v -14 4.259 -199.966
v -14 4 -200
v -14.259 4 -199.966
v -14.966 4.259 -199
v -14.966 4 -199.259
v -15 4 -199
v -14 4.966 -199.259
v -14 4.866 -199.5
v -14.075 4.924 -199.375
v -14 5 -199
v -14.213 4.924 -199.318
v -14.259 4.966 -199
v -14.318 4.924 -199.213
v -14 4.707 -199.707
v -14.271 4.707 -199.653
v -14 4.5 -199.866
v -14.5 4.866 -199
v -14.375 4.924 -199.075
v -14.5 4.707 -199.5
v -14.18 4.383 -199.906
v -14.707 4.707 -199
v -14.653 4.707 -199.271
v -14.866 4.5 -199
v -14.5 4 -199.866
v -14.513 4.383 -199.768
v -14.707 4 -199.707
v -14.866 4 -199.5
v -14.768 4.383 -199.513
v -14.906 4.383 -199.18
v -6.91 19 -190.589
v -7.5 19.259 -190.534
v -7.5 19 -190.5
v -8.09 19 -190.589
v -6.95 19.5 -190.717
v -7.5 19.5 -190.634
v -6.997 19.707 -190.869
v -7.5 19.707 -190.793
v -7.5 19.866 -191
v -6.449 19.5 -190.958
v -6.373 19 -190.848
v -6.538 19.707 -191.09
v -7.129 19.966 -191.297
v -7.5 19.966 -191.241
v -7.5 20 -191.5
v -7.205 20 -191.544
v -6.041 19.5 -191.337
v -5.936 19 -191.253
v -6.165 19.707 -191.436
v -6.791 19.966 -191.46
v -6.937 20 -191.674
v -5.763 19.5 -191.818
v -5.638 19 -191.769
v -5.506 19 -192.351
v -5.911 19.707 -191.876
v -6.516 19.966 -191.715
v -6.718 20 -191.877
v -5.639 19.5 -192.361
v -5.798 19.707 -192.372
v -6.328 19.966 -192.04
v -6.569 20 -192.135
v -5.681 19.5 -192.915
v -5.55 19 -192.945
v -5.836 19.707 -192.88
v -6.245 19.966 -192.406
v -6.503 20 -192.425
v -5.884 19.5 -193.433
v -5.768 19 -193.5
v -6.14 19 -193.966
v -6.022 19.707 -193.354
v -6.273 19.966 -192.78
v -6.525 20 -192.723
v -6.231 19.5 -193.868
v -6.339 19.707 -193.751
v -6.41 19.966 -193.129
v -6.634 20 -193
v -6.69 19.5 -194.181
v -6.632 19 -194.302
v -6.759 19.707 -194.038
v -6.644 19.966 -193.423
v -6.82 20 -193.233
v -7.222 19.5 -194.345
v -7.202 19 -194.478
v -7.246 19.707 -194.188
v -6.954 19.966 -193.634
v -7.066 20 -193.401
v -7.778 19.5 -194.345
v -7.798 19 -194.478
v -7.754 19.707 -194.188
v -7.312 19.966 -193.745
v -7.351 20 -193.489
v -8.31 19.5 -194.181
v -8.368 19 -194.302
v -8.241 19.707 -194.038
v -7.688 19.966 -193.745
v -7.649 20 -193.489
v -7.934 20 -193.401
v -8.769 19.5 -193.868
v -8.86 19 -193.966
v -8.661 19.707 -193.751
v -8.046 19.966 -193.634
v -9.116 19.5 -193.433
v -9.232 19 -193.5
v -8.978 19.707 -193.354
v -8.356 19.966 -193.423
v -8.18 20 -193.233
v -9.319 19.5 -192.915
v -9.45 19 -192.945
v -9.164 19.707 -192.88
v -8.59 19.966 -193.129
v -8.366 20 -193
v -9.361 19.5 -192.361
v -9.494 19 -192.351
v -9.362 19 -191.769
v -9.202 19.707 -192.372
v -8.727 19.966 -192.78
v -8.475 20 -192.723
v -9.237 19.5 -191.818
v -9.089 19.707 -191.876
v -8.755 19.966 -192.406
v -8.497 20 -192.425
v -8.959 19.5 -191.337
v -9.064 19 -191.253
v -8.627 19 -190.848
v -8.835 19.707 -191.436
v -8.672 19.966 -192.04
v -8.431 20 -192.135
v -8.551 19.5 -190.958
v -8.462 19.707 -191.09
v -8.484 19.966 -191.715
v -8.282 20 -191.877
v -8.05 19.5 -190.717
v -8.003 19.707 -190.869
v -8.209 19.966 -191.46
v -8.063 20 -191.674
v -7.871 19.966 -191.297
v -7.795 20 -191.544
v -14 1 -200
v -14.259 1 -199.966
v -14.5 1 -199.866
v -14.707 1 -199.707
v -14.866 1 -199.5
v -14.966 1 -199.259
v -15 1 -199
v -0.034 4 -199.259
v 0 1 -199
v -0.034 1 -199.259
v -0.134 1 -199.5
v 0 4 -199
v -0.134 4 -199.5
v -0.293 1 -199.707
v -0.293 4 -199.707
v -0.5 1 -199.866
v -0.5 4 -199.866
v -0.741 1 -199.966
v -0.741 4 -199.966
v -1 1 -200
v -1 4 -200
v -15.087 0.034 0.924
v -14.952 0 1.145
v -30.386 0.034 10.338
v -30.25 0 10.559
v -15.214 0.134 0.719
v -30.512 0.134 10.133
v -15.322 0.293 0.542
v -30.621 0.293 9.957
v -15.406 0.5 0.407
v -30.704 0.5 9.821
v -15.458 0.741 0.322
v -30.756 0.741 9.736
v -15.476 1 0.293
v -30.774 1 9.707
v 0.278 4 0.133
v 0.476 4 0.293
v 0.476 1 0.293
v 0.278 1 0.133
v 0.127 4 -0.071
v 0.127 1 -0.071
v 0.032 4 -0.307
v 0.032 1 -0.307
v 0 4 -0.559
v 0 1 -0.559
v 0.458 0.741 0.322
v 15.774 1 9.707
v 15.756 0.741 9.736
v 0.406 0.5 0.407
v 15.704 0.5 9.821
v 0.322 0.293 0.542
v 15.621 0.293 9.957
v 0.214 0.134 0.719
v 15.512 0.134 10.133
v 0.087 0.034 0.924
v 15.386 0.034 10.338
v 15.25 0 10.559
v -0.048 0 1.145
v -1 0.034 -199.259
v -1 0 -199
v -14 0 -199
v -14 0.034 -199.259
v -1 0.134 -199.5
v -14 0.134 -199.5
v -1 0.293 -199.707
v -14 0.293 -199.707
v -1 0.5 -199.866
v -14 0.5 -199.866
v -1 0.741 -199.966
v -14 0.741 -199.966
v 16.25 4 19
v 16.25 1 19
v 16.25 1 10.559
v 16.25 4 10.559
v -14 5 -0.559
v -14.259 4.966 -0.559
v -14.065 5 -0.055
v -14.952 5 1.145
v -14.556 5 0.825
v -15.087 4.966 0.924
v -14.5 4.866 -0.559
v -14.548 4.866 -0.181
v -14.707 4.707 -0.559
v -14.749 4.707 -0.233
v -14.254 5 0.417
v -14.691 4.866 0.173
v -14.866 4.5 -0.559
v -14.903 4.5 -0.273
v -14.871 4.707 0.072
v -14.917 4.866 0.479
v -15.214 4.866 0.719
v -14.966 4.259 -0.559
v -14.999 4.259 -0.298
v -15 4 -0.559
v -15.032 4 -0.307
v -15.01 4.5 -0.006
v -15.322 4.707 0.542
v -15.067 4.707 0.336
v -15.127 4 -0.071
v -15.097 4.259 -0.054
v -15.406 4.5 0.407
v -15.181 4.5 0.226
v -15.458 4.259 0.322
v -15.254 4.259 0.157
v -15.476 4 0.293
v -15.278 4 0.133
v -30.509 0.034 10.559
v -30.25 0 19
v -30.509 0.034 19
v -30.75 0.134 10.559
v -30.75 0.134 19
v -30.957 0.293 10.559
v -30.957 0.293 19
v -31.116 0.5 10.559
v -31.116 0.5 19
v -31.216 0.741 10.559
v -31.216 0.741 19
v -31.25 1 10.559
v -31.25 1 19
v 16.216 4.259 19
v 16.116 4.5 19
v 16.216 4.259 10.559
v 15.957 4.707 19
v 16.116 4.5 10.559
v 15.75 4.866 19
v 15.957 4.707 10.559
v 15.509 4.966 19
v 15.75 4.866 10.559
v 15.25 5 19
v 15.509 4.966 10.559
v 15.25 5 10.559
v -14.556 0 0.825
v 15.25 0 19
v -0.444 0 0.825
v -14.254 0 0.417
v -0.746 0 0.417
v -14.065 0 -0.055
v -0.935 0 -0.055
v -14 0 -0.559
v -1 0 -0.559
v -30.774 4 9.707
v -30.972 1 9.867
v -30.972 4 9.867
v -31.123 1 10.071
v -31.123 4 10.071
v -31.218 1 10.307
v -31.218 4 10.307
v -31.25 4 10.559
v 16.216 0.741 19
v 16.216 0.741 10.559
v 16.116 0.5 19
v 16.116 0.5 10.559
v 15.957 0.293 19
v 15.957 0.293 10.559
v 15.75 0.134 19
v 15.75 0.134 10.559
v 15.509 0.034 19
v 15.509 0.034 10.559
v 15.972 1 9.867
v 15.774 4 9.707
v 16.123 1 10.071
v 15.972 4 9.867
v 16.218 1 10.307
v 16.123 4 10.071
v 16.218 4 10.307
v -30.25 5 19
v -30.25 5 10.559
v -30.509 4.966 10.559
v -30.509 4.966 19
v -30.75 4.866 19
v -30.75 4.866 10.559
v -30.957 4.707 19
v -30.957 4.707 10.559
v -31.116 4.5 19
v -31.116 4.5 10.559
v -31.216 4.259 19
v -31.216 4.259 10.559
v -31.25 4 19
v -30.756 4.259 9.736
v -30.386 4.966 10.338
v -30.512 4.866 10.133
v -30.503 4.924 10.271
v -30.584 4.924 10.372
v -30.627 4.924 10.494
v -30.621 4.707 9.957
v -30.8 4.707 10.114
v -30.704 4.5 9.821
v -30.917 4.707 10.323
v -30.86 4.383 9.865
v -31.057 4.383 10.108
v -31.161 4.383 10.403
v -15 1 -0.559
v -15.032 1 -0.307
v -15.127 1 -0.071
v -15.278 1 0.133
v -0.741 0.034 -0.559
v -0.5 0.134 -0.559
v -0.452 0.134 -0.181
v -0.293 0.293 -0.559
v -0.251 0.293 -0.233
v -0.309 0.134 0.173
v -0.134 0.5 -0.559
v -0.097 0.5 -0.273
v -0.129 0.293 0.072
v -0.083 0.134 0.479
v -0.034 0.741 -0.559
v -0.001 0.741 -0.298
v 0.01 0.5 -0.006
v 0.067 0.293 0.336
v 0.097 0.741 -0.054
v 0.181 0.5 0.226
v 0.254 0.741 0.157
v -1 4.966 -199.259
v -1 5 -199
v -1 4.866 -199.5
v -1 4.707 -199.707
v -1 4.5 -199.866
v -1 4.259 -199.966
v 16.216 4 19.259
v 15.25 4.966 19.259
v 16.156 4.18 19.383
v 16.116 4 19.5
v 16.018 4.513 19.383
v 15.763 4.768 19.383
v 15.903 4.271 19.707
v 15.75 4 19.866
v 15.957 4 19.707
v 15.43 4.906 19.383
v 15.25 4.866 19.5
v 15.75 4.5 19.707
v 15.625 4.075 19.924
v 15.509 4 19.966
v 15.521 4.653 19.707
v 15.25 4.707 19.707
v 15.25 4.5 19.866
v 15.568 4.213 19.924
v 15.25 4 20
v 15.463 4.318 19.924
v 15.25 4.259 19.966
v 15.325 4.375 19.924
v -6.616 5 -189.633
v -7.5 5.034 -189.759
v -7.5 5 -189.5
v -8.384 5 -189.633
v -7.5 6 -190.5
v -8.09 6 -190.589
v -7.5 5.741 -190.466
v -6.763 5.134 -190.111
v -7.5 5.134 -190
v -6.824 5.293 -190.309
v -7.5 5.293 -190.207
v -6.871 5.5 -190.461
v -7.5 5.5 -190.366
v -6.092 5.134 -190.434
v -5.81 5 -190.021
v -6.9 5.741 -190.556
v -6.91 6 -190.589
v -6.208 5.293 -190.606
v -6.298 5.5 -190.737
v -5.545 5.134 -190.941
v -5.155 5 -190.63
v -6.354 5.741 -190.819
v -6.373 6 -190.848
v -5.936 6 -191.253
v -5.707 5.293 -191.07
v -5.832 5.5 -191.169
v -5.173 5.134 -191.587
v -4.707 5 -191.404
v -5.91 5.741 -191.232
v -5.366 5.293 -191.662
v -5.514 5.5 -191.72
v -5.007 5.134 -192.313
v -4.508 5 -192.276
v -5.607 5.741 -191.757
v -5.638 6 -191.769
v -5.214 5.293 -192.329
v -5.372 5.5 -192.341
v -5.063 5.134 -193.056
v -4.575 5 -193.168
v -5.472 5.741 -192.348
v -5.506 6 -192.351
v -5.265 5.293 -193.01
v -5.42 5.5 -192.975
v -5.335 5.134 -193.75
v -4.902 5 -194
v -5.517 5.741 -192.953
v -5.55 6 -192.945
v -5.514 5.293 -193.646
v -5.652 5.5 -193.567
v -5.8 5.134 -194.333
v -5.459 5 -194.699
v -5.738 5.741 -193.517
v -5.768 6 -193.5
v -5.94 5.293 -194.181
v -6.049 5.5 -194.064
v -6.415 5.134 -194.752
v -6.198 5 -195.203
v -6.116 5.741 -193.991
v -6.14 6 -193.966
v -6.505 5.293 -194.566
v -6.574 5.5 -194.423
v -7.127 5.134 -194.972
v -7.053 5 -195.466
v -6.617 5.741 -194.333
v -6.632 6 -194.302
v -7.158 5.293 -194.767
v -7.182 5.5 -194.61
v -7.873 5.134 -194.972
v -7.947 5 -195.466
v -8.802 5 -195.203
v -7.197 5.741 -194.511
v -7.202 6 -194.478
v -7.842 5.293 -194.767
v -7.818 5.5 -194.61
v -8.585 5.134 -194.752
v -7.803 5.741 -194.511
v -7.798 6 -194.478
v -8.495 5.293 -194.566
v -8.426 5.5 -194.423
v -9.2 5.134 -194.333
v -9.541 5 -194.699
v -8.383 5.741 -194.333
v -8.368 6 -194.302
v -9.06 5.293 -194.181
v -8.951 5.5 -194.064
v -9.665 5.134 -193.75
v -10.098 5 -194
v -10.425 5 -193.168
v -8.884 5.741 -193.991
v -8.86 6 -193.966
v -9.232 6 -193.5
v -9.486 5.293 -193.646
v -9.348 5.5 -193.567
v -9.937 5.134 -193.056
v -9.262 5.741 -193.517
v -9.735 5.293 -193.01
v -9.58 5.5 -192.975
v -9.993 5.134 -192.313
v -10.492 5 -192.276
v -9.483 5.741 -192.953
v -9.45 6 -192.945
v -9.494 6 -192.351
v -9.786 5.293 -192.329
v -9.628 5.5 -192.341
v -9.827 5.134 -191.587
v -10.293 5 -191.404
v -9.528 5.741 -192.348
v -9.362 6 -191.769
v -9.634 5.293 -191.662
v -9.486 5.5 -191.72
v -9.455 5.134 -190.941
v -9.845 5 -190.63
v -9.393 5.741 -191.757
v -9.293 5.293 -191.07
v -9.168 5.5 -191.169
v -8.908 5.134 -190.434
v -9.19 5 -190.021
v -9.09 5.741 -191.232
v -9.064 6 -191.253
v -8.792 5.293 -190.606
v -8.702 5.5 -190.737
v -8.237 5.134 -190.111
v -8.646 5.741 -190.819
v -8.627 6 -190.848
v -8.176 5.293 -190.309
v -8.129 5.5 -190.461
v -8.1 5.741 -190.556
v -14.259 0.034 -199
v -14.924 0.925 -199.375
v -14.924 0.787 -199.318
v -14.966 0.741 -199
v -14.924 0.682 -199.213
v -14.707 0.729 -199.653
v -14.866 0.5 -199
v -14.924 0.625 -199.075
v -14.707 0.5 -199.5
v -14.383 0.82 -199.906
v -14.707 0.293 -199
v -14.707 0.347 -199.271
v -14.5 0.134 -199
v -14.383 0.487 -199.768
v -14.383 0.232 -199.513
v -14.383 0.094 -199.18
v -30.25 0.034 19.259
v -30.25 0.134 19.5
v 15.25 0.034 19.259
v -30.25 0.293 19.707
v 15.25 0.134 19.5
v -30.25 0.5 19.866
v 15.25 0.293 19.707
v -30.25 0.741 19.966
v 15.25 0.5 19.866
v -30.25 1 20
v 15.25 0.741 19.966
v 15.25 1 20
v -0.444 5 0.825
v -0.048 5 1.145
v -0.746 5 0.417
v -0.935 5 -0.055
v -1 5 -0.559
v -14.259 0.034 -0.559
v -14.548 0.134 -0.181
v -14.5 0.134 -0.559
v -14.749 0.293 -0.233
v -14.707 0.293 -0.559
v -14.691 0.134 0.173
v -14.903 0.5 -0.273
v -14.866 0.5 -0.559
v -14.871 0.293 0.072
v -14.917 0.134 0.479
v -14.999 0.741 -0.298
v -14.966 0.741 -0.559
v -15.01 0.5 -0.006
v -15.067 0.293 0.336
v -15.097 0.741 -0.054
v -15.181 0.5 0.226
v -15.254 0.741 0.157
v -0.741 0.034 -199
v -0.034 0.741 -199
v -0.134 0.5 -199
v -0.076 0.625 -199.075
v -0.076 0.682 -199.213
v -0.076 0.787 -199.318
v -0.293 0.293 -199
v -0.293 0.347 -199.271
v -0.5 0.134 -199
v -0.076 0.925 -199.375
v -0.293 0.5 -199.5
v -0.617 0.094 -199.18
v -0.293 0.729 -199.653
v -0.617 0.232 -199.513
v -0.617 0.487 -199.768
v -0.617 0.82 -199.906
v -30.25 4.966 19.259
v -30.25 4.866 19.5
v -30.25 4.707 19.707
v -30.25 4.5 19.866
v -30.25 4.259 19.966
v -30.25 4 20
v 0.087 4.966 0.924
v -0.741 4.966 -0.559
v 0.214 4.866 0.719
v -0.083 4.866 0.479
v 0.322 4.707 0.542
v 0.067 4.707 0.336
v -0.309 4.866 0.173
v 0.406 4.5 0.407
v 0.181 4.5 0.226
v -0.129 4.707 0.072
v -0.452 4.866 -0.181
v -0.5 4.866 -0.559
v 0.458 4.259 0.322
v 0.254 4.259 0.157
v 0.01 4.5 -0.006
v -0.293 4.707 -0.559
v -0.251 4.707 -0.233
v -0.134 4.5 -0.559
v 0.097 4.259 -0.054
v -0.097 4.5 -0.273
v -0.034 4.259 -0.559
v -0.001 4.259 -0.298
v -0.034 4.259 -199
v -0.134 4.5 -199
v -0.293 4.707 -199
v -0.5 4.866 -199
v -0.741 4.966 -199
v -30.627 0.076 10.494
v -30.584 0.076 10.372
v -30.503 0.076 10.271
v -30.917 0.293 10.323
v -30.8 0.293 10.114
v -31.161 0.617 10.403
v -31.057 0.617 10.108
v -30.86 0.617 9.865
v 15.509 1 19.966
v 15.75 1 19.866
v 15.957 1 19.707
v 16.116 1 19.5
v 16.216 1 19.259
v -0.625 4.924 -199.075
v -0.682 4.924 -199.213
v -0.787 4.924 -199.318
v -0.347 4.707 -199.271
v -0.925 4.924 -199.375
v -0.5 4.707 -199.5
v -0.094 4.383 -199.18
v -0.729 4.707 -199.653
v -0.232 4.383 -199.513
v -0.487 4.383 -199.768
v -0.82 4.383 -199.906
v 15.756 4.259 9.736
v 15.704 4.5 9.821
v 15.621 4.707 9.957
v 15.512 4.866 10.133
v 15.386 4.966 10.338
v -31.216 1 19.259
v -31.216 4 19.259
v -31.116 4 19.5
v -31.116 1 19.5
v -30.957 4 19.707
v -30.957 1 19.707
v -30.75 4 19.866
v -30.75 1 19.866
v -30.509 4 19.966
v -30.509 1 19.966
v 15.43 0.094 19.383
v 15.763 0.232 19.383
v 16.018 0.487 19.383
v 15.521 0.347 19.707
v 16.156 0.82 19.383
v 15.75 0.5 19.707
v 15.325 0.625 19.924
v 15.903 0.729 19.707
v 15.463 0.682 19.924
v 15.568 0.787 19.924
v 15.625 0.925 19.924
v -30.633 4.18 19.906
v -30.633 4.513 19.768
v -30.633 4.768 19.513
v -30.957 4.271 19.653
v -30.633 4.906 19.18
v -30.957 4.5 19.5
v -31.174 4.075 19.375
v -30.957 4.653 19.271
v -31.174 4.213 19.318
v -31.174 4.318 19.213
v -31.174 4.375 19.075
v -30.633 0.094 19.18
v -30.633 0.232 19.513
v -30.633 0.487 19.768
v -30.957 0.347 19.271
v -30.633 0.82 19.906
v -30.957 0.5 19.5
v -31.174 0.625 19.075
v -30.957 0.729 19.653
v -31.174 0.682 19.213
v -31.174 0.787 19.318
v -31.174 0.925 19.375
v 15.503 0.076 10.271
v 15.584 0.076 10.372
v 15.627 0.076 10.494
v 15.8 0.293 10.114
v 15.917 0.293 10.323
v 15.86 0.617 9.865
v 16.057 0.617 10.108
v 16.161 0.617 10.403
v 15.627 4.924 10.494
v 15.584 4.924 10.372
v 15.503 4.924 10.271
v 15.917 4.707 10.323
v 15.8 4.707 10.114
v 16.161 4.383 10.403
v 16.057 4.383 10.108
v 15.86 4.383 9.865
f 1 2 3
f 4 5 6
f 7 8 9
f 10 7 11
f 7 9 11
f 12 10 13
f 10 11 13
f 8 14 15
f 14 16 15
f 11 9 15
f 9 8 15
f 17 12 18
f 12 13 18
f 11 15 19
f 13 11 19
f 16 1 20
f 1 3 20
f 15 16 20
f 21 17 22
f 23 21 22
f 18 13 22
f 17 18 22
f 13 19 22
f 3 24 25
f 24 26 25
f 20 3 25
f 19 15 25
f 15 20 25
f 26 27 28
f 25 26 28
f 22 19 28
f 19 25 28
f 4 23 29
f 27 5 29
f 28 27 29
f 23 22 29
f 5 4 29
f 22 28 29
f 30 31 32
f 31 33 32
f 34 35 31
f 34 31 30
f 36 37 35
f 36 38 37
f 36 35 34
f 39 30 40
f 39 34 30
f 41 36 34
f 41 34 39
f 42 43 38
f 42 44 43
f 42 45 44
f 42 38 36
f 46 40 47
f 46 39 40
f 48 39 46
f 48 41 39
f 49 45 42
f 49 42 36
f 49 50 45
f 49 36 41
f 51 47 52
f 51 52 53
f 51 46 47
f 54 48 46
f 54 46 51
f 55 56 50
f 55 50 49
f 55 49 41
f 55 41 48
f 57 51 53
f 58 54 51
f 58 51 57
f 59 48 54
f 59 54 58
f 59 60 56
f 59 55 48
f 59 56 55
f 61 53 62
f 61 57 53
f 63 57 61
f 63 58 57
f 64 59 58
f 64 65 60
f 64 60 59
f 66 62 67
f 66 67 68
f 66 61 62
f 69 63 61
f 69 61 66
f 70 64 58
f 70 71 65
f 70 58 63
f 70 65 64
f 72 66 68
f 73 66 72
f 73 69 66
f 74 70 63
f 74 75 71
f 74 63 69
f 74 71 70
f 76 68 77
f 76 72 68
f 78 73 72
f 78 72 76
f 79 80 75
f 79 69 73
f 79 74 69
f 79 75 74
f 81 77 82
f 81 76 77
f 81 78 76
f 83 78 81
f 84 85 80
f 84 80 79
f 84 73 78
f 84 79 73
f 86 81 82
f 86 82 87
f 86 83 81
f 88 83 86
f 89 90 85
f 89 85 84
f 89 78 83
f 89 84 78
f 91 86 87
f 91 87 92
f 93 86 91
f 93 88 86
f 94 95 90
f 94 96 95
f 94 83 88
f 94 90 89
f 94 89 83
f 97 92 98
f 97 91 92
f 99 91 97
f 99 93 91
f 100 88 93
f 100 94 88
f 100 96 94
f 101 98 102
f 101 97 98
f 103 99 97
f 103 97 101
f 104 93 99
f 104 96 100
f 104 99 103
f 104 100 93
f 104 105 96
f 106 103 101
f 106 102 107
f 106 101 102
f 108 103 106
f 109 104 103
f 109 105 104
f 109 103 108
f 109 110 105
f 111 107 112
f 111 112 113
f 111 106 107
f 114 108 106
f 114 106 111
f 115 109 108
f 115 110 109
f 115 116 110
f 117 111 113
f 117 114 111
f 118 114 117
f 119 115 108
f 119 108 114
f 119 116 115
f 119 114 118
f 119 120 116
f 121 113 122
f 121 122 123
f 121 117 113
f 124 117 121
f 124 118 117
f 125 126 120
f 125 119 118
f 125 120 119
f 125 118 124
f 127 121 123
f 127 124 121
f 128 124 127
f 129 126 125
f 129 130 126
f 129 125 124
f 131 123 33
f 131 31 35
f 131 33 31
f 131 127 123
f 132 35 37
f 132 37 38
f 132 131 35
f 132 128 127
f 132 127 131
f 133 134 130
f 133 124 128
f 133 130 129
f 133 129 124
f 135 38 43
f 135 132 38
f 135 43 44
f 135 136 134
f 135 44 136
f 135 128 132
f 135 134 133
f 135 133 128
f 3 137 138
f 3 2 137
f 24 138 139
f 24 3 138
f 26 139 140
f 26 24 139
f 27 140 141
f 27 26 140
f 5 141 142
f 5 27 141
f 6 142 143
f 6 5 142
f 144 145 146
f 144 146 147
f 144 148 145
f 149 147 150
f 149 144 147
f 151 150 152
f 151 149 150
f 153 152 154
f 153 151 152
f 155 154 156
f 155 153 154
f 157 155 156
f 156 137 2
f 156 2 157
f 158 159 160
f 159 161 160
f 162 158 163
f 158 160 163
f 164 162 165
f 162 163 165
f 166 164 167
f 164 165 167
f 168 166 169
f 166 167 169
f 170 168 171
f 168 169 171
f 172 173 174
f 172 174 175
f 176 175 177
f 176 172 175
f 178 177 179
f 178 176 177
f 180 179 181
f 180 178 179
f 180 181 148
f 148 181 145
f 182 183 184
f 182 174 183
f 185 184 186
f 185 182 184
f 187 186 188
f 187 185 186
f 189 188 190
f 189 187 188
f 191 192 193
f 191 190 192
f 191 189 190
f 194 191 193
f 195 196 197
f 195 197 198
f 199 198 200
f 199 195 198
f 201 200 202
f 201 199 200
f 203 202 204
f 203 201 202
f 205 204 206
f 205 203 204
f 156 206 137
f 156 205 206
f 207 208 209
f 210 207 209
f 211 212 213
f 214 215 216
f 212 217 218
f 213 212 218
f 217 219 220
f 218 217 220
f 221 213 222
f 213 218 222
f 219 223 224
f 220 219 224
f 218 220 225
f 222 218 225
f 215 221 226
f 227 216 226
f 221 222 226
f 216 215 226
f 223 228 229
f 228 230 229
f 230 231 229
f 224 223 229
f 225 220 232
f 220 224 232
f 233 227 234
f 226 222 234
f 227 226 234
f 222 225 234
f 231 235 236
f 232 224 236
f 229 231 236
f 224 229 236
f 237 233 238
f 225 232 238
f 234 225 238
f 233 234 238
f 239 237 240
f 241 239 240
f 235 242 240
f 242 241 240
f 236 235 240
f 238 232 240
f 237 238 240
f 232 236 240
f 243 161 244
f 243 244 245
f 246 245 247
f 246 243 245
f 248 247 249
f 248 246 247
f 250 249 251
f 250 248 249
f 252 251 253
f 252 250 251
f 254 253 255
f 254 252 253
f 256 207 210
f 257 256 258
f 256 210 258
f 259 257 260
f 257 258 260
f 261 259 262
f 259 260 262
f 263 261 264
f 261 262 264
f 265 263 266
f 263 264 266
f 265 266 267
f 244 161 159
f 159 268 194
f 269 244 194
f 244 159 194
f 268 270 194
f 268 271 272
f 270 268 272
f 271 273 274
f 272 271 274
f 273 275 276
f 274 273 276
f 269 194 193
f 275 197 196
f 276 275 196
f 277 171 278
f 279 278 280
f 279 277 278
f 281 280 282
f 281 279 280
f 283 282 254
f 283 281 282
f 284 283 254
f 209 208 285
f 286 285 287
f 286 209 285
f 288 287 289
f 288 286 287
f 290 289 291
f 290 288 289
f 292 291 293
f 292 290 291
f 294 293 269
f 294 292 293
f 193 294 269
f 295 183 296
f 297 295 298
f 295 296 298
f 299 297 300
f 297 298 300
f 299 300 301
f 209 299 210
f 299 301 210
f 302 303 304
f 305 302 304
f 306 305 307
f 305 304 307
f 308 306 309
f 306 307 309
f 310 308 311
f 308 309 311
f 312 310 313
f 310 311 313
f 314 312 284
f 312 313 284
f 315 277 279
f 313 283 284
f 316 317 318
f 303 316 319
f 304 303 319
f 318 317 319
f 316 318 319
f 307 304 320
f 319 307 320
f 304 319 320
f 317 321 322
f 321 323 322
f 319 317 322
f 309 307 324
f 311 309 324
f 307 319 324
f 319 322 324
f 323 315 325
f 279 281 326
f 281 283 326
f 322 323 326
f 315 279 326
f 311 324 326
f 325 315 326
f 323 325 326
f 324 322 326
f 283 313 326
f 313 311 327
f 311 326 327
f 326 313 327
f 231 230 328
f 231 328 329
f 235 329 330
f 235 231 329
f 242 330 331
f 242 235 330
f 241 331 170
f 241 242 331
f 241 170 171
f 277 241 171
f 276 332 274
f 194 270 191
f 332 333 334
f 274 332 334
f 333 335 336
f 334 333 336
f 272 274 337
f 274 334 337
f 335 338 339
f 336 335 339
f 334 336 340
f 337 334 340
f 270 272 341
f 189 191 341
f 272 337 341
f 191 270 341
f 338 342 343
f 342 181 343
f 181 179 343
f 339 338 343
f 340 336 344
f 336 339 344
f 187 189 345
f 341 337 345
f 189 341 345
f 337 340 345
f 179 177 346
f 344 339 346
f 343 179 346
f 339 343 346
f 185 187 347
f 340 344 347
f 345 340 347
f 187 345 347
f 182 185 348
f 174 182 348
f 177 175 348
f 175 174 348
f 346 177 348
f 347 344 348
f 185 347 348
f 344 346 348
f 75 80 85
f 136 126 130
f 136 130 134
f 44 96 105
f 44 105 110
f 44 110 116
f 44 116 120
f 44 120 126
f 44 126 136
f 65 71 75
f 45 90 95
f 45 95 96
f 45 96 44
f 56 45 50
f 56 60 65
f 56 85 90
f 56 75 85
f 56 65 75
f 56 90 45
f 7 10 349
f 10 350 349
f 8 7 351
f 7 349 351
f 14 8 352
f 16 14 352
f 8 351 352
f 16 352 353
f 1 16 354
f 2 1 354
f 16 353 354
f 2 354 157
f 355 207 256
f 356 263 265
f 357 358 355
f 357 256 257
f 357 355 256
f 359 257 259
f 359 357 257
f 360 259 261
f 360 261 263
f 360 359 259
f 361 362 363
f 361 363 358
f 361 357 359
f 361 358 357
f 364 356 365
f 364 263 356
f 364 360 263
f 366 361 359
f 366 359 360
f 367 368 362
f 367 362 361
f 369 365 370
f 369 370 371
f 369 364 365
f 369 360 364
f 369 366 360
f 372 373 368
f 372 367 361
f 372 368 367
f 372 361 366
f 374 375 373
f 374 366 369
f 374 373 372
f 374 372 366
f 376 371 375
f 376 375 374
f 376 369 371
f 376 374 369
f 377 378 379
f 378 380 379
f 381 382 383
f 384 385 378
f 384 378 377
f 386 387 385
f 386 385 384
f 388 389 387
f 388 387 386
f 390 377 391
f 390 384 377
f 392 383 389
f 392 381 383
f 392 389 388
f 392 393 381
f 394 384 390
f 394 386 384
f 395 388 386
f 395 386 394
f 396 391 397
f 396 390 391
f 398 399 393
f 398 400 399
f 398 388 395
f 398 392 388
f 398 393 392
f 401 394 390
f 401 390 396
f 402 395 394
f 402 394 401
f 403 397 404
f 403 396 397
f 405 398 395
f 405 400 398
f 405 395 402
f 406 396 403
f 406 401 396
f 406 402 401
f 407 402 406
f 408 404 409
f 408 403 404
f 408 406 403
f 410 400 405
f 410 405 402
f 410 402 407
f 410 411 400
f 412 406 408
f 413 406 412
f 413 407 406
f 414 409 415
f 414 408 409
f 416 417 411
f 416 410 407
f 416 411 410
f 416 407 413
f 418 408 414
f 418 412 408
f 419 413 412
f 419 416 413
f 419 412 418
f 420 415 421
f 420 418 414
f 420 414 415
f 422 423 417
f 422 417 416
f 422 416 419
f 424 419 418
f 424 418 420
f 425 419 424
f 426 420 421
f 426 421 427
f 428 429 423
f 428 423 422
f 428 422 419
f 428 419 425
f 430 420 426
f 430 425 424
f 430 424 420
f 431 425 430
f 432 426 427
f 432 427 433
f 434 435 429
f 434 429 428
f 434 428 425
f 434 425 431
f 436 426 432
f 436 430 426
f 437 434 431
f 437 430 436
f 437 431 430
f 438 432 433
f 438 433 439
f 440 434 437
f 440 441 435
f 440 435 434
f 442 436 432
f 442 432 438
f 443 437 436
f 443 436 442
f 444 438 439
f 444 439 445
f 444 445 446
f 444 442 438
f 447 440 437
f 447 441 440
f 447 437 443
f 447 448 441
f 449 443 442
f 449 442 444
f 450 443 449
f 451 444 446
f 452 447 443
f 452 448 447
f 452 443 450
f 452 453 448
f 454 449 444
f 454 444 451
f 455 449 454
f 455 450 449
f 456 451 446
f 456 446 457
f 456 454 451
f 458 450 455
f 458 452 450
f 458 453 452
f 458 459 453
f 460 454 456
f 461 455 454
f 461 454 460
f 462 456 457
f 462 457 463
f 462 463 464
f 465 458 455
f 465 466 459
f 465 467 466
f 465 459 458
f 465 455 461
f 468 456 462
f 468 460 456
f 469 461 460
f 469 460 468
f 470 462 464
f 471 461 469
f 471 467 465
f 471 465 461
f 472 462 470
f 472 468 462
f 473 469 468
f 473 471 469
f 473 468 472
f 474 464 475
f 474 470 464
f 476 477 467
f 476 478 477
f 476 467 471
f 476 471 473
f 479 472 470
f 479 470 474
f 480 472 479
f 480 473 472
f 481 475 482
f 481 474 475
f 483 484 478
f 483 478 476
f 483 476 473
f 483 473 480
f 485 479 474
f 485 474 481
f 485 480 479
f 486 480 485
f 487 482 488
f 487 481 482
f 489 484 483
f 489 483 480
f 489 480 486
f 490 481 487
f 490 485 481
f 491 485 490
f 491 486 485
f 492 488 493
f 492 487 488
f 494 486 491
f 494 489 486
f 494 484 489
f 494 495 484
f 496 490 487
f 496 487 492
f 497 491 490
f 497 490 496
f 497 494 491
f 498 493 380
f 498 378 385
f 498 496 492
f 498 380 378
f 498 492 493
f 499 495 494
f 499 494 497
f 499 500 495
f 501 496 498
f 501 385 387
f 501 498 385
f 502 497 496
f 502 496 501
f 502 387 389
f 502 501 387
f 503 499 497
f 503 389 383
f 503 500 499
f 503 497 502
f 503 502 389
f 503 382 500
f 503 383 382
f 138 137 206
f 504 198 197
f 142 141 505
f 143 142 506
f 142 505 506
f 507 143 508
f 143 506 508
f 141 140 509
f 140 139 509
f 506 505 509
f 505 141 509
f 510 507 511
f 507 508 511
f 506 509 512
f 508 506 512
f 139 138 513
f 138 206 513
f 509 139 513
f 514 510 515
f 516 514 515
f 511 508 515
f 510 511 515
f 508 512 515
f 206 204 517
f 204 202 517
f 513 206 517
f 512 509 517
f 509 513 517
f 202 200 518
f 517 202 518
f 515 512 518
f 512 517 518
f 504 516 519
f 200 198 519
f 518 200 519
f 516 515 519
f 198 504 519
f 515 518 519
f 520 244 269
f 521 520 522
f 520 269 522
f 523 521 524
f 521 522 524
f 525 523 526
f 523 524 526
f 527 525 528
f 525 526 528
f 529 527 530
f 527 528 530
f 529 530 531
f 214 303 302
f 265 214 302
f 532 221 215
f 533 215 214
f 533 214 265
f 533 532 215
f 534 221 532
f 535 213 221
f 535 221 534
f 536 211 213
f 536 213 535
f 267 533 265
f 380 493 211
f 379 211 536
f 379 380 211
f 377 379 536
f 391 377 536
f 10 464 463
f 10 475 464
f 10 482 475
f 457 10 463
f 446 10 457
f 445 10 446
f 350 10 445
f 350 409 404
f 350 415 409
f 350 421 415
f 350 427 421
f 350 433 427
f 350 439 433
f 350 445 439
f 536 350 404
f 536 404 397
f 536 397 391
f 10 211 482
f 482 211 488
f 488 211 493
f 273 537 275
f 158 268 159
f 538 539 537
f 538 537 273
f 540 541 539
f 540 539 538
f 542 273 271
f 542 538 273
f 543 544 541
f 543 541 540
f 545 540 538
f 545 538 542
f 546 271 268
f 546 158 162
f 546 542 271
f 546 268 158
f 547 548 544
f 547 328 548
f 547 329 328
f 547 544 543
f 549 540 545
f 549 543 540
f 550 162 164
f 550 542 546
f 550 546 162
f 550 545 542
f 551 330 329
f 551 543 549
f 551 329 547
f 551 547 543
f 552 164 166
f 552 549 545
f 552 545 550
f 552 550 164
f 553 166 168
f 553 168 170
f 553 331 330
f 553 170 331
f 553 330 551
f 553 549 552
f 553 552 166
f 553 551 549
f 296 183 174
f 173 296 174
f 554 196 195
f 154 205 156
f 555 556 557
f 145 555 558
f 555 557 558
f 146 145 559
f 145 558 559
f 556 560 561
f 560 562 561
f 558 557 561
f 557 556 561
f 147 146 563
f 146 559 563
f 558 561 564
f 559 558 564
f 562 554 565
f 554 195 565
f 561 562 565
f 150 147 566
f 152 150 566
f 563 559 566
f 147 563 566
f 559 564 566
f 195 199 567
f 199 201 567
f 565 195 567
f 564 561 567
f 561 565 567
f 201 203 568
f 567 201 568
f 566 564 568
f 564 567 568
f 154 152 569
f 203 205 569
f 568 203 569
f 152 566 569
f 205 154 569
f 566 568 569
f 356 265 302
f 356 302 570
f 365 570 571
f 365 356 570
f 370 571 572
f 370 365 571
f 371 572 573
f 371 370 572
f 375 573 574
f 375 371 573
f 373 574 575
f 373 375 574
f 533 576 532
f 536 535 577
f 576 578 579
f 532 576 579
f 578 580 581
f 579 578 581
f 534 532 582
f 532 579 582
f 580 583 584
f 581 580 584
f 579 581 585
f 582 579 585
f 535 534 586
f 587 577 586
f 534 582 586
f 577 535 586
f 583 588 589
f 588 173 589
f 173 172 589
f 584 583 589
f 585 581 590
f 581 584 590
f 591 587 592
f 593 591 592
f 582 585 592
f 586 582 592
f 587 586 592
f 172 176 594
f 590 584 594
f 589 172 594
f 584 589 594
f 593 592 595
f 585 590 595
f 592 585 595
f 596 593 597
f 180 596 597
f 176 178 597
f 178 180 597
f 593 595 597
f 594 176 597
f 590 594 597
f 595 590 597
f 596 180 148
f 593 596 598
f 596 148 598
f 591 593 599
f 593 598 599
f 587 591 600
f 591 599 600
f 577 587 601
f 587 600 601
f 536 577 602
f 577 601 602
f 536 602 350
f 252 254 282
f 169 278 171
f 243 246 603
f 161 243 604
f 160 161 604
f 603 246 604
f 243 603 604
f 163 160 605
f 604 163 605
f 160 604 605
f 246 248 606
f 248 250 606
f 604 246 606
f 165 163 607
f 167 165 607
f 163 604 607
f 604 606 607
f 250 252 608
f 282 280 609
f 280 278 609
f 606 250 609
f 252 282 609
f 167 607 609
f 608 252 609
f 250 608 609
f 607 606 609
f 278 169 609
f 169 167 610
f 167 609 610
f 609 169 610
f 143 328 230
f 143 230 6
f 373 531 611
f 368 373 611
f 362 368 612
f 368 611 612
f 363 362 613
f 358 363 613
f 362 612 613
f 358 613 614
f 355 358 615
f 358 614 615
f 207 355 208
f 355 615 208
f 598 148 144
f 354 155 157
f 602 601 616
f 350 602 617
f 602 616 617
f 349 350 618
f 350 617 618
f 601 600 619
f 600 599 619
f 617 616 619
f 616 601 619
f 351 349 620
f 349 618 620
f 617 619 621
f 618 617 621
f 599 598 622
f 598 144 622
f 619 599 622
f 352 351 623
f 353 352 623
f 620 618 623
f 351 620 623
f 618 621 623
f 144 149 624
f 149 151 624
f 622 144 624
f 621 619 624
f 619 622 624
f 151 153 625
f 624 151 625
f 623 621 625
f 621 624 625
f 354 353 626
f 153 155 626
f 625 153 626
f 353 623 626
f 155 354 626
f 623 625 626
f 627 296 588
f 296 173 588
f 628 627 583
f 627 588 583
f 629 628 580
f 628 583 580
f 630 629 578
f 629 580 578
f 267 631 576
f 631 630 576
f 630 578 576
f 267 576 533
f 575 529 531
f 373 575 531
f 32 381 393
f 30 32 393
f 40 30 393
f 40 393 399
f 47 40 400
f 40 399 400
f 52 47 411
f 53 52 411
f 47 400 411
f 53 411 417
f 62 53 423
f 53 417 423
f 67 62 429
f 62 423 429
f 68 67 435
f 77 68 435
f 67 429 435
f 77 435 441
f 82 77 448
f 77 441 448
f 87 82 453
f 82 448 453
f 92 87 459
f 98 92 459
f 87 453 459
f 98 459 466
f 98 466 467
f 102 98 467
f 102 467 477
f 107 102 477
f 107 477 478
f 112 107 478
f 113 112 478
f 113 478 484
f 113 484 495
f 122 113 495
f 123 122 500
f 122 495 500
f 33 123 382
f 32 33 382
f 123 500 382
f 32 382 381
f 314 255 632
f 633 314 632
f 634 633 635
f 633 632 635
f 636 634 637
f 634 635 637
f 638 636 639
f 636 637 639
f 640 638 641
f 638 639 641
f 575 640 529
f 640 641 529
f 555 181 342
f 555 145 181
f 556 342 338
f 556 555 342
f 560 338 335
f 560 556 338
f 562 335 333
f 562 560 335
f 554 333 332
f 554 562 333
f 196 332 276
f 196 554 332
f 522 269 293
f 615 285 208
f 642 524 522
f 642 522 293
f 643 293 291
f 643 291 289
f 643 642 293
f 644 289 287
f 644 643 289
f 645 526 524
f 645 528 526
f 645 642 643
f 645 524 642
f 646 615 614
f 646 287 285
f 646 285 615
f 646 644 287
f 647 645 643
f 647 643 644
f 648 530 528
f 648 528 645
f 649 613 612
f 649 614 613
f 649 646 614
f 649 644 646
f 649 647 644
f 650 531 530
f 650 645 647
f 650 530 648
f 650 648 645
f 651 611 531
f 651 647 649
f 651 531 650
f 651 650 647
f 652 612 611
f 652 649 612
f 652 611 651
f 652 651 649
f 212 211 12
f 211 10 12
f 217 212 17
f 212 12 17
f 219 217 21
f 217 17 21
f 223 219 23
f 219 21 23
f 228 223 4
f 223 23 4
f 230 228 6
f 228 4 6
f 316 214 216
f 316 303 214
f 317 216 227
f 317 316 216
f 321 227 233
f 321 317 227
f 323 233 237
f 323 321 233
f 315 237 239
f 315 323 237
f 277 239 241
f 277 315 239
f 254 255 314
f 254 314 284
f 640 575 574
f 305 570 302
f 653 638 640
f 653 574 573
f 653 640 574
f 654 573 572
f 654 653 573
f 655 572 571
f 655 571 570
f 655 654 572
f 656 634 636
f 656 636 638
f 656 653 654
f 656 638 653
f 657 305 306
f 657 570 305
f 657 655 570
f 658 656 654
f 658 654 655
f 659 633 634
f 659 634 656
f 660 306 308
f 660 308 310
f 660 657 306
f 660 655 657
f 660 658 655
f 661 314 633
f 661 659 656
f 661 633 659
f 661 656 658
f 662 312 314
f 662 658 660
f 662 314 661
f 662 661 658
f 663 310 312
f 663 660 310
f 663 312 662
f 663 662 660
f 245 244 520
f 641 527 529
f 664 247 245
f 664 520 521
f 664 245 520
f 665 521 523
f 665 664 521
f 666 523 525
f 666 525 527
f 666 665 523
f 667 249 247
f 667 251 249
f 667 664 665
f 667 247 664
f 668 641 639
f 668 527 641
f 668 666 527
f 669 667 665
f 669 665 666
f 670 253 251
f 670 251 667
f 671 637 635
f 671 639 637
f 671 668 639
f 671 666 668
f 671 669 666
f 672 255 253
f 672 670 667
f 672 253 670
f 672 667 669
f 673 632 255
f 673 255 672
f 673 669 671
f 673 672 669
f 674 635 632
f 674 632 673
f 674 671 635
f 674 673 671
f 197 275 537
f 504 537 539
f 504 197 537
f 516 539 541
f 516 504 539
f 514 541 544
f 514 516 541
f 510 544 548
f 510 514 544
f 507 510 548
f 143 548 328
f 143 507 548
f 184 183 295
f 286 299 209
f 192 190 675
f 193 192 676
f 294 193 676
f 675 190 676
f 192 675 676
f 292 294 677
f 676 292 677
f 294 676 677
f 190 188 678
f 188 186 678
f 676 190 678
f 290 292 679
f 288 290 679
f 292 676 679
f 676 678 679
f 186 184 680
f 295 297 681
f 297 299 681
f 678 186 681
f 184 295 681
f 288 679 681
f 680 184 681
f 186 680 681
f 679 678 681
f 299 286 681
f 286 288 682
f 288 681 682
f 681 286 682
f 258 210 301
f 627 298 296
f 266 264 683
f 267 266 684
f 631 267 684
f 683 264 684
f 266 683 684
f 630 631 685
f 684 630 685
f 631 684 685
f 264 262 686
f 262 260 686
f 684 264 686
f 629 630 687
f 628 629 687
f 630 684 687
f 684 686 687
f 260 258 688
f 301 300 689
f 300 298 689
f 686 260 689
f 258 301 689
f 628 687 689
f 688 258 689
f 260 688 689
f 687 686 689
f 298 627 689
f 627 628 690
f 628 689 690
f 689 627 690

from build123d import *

# Parameters (mm, degrees)
SKETCH1_W           = 15
SKETCH1_H           = 200
SKETCH1_W_2         = 47.5
SKETCH1_H_2         = 10
BOSS_EXTRUDE1_DEPTH = 5
SKETCH4_R           = 2
BOSS_EXTRUDE3_DEPTH = 15
FILLET5_R           = 1
FILLET6_R           = 1


with BuildPart() as part:
    # Sketch1 → Boss-Extrude1 (new body)
    with BuildSketch(Plane(origin=(0, 0, 0), x_dir=(1, 0, 0), z_dir=(0, 1, 0))):
        Polygon((-31.25, -10), (16.25, -10), (0, 0), (-15, 0), align=None)
        with Locations((-7.5, 100)):
            Rectangle(SKETCH1_W, SKETCH1_H)
        with Locations((-7.5, -15)):
            Rectangle(SKETCH1_W_2, SKETCH1_H_2)
    extrude(amount=BOSS_EXTRUDE1_DEPTH)

    # Sketch4 → Boss-Extrude3 (add)
    with BuildSketch(Plane(origin=(0, 5, 0), x_dir=(1, 0, 0), z_dir=(0, 1, 0))):
        with Locations(Location((-7.5, 192.5, 0), (0, 0, 270))):
            Circle(SKETCH4_R)
    extrude(amount=BOSS_EXTRUDE3_DEPTH)

    # Fillet5
    fillet5_edges = [part.edges().sort_by_distance(p)[0] for p in [
        (-31.25, 5, 15),
        (-7.5, 0, -200),
        (0, 0, -100),
        (8.125, 0, 5),
        (16.25, 0, 15),
        (-7.5, 0, 20),
        (-31.25, 0, 15),
        (-23.125, 0, 5),
        (-7.5, 5, 20),
        (-15, 2.5, 0),
        (-15, 2.5, -200),
        (0, 2.5, -200),
        (0, 2.5, 0),
        (16.25, 2.5, 10),
        (-31.25, 2.5, 10),
        (16.25, 5, 15),
        (8.125, 5, 5),
        (-7.5, 5, -194.5),
        (-7.5, 20, -194.5),
        (0, 5, -100),
        (-7.5, 5, -200),
        (-15, 5, -100),
        (-23.125, 5, 5),
        (-15, 0, -100),
    ]]
    fillet(fillet5_edges, radius=FILLET5_R)

    # Fillet6
    # the kernel refuses this fillet: 1 mm, written as the material it takes off along each edge
    with BuildSketch(Plane(origin=(15.25, 4, 19), x_dir=(1, 0, 0), z_dir=(0, 0, 1))) as fillet6_piece_1_section:
        Polygon((0, 0), (FILLET6_R, 0), (FILLET6_R, FILLET6_R), (0, FILLET6_R), align=None)
    fillet6_piece_1 = extrude(amount=FILLET6_R, mode=Mode.PRIVATE)
    fillet6_piece_1 = fillet6_piece_1 - Plane(origin=(15.25, 4, 19), x_dir=(-0.7071067811865475, -0.7071067811865475, 0), z_dir=(0, 0, 1)) * Sphere(FILLET6_R, mode=Mode.PRIVATE)
    add(fillet6_piece_1, mode=Mode.SUBTRACT)
    with BuildSketch(Plane(origin=(15.25, 1, 19), x_dir=(1, 0, 0), z_dir=(0, 0, 1))) as fillet6_piece_2_section:
        Polygon((0, 0), (FILLET6_R, 0), (FILLET6_R, -FILLET6_R), (0, -FILLET6_R), align=None)
    fillet6_piece_2 = extrude(amount=FILLET6_R, mode=Mode.PRIVATE)
    fillet6_piece_2 = fillet6_piece_2 - Plane(origin=(15.25, 1, 19), x_dir=(-0.7071067811865475, 0.7071067811865475, 0), z_dir=(0, 0, 1)) * Sphere(FILLET6_R, mode=Mode.PRIVATE)
    add(fillet6_piece_2, mode=Mode.SUBTRACT)
    with BuildSketch(Plane(origin=(-30.25, 4, 19), x_dir=(0, 0, 1), z_dir=(-1, 0, 0))) as fillet6_piece_3_section:
        Polygon((0, 0), (FILLET6_R, 0), (FILLET6_R, FILLET6_R), (0, FILLET6_R), align=None)
    fillet6_piece_3 = extrude(amount=FILLET6_R, mode=Mode.PRIVATE)
    fillet6_piece_3 = fillet6_piece_3 - Plane(origin=(-30.25, 4, 19), x_dir=(0, -0.7071067811865475, -0.7071067811865475), z_dir=(-1, 0, 0)) * Sphere(FILLET6_R, mode=Mode.PRIVATE)
    add(fillet6_piece_3, mode=Mode.SUBTRACT)
    with BuildSketch(Plane(origin=(-30.25, 1, 19), x_dir=(0, 0, 1), z_dir=(-1, 0, 0))) as fillet6_piece_4_section:
        Polygon((0, 0), (FILLET6_R, 0), (FILLET6_R, -FILLET6_R), (0, -FILLET6_R), align=None)
    fillet6_piece_4 = extrude(amount=FILLET6_R, mode=Mode.PRIVATE)
    fillet6_piece_4 = fillet6_piece_4 - Plane(origin=(-30.25, 1, 19), x_dir=(0, 0.7071067811865475, -0.7071067811865475), z_dir=(-1, 0, 0)) * Sphere(FILLET6_R, mode=Mode.PRIVATE)
    add(fillet6_piece_4, mode=Mode.SUBTRACT)
    with BuildSketch(Plane(origin=(-31.25, 1, 20), x_dir=(0, 0, -1), z_dir=(0, 1, 0)), Plane(origin=(16.25, 1, 20), x_dir=(-1, 0, 0), z_dir=(0, 1, 0))) as fillet6_piece_5:
        with BuildLine():
            CenterArc((FILLET6_R, -FILLET6_R), FILLET6_R, 90, 90)
            Line((0, -FILLET6_R), (0, 0))
            Line((0, 0), (FILLET6_R, 0))
        make_face()
    extrude(amount=3, mode=Mode.SUBTRACT)


solid = part.part
